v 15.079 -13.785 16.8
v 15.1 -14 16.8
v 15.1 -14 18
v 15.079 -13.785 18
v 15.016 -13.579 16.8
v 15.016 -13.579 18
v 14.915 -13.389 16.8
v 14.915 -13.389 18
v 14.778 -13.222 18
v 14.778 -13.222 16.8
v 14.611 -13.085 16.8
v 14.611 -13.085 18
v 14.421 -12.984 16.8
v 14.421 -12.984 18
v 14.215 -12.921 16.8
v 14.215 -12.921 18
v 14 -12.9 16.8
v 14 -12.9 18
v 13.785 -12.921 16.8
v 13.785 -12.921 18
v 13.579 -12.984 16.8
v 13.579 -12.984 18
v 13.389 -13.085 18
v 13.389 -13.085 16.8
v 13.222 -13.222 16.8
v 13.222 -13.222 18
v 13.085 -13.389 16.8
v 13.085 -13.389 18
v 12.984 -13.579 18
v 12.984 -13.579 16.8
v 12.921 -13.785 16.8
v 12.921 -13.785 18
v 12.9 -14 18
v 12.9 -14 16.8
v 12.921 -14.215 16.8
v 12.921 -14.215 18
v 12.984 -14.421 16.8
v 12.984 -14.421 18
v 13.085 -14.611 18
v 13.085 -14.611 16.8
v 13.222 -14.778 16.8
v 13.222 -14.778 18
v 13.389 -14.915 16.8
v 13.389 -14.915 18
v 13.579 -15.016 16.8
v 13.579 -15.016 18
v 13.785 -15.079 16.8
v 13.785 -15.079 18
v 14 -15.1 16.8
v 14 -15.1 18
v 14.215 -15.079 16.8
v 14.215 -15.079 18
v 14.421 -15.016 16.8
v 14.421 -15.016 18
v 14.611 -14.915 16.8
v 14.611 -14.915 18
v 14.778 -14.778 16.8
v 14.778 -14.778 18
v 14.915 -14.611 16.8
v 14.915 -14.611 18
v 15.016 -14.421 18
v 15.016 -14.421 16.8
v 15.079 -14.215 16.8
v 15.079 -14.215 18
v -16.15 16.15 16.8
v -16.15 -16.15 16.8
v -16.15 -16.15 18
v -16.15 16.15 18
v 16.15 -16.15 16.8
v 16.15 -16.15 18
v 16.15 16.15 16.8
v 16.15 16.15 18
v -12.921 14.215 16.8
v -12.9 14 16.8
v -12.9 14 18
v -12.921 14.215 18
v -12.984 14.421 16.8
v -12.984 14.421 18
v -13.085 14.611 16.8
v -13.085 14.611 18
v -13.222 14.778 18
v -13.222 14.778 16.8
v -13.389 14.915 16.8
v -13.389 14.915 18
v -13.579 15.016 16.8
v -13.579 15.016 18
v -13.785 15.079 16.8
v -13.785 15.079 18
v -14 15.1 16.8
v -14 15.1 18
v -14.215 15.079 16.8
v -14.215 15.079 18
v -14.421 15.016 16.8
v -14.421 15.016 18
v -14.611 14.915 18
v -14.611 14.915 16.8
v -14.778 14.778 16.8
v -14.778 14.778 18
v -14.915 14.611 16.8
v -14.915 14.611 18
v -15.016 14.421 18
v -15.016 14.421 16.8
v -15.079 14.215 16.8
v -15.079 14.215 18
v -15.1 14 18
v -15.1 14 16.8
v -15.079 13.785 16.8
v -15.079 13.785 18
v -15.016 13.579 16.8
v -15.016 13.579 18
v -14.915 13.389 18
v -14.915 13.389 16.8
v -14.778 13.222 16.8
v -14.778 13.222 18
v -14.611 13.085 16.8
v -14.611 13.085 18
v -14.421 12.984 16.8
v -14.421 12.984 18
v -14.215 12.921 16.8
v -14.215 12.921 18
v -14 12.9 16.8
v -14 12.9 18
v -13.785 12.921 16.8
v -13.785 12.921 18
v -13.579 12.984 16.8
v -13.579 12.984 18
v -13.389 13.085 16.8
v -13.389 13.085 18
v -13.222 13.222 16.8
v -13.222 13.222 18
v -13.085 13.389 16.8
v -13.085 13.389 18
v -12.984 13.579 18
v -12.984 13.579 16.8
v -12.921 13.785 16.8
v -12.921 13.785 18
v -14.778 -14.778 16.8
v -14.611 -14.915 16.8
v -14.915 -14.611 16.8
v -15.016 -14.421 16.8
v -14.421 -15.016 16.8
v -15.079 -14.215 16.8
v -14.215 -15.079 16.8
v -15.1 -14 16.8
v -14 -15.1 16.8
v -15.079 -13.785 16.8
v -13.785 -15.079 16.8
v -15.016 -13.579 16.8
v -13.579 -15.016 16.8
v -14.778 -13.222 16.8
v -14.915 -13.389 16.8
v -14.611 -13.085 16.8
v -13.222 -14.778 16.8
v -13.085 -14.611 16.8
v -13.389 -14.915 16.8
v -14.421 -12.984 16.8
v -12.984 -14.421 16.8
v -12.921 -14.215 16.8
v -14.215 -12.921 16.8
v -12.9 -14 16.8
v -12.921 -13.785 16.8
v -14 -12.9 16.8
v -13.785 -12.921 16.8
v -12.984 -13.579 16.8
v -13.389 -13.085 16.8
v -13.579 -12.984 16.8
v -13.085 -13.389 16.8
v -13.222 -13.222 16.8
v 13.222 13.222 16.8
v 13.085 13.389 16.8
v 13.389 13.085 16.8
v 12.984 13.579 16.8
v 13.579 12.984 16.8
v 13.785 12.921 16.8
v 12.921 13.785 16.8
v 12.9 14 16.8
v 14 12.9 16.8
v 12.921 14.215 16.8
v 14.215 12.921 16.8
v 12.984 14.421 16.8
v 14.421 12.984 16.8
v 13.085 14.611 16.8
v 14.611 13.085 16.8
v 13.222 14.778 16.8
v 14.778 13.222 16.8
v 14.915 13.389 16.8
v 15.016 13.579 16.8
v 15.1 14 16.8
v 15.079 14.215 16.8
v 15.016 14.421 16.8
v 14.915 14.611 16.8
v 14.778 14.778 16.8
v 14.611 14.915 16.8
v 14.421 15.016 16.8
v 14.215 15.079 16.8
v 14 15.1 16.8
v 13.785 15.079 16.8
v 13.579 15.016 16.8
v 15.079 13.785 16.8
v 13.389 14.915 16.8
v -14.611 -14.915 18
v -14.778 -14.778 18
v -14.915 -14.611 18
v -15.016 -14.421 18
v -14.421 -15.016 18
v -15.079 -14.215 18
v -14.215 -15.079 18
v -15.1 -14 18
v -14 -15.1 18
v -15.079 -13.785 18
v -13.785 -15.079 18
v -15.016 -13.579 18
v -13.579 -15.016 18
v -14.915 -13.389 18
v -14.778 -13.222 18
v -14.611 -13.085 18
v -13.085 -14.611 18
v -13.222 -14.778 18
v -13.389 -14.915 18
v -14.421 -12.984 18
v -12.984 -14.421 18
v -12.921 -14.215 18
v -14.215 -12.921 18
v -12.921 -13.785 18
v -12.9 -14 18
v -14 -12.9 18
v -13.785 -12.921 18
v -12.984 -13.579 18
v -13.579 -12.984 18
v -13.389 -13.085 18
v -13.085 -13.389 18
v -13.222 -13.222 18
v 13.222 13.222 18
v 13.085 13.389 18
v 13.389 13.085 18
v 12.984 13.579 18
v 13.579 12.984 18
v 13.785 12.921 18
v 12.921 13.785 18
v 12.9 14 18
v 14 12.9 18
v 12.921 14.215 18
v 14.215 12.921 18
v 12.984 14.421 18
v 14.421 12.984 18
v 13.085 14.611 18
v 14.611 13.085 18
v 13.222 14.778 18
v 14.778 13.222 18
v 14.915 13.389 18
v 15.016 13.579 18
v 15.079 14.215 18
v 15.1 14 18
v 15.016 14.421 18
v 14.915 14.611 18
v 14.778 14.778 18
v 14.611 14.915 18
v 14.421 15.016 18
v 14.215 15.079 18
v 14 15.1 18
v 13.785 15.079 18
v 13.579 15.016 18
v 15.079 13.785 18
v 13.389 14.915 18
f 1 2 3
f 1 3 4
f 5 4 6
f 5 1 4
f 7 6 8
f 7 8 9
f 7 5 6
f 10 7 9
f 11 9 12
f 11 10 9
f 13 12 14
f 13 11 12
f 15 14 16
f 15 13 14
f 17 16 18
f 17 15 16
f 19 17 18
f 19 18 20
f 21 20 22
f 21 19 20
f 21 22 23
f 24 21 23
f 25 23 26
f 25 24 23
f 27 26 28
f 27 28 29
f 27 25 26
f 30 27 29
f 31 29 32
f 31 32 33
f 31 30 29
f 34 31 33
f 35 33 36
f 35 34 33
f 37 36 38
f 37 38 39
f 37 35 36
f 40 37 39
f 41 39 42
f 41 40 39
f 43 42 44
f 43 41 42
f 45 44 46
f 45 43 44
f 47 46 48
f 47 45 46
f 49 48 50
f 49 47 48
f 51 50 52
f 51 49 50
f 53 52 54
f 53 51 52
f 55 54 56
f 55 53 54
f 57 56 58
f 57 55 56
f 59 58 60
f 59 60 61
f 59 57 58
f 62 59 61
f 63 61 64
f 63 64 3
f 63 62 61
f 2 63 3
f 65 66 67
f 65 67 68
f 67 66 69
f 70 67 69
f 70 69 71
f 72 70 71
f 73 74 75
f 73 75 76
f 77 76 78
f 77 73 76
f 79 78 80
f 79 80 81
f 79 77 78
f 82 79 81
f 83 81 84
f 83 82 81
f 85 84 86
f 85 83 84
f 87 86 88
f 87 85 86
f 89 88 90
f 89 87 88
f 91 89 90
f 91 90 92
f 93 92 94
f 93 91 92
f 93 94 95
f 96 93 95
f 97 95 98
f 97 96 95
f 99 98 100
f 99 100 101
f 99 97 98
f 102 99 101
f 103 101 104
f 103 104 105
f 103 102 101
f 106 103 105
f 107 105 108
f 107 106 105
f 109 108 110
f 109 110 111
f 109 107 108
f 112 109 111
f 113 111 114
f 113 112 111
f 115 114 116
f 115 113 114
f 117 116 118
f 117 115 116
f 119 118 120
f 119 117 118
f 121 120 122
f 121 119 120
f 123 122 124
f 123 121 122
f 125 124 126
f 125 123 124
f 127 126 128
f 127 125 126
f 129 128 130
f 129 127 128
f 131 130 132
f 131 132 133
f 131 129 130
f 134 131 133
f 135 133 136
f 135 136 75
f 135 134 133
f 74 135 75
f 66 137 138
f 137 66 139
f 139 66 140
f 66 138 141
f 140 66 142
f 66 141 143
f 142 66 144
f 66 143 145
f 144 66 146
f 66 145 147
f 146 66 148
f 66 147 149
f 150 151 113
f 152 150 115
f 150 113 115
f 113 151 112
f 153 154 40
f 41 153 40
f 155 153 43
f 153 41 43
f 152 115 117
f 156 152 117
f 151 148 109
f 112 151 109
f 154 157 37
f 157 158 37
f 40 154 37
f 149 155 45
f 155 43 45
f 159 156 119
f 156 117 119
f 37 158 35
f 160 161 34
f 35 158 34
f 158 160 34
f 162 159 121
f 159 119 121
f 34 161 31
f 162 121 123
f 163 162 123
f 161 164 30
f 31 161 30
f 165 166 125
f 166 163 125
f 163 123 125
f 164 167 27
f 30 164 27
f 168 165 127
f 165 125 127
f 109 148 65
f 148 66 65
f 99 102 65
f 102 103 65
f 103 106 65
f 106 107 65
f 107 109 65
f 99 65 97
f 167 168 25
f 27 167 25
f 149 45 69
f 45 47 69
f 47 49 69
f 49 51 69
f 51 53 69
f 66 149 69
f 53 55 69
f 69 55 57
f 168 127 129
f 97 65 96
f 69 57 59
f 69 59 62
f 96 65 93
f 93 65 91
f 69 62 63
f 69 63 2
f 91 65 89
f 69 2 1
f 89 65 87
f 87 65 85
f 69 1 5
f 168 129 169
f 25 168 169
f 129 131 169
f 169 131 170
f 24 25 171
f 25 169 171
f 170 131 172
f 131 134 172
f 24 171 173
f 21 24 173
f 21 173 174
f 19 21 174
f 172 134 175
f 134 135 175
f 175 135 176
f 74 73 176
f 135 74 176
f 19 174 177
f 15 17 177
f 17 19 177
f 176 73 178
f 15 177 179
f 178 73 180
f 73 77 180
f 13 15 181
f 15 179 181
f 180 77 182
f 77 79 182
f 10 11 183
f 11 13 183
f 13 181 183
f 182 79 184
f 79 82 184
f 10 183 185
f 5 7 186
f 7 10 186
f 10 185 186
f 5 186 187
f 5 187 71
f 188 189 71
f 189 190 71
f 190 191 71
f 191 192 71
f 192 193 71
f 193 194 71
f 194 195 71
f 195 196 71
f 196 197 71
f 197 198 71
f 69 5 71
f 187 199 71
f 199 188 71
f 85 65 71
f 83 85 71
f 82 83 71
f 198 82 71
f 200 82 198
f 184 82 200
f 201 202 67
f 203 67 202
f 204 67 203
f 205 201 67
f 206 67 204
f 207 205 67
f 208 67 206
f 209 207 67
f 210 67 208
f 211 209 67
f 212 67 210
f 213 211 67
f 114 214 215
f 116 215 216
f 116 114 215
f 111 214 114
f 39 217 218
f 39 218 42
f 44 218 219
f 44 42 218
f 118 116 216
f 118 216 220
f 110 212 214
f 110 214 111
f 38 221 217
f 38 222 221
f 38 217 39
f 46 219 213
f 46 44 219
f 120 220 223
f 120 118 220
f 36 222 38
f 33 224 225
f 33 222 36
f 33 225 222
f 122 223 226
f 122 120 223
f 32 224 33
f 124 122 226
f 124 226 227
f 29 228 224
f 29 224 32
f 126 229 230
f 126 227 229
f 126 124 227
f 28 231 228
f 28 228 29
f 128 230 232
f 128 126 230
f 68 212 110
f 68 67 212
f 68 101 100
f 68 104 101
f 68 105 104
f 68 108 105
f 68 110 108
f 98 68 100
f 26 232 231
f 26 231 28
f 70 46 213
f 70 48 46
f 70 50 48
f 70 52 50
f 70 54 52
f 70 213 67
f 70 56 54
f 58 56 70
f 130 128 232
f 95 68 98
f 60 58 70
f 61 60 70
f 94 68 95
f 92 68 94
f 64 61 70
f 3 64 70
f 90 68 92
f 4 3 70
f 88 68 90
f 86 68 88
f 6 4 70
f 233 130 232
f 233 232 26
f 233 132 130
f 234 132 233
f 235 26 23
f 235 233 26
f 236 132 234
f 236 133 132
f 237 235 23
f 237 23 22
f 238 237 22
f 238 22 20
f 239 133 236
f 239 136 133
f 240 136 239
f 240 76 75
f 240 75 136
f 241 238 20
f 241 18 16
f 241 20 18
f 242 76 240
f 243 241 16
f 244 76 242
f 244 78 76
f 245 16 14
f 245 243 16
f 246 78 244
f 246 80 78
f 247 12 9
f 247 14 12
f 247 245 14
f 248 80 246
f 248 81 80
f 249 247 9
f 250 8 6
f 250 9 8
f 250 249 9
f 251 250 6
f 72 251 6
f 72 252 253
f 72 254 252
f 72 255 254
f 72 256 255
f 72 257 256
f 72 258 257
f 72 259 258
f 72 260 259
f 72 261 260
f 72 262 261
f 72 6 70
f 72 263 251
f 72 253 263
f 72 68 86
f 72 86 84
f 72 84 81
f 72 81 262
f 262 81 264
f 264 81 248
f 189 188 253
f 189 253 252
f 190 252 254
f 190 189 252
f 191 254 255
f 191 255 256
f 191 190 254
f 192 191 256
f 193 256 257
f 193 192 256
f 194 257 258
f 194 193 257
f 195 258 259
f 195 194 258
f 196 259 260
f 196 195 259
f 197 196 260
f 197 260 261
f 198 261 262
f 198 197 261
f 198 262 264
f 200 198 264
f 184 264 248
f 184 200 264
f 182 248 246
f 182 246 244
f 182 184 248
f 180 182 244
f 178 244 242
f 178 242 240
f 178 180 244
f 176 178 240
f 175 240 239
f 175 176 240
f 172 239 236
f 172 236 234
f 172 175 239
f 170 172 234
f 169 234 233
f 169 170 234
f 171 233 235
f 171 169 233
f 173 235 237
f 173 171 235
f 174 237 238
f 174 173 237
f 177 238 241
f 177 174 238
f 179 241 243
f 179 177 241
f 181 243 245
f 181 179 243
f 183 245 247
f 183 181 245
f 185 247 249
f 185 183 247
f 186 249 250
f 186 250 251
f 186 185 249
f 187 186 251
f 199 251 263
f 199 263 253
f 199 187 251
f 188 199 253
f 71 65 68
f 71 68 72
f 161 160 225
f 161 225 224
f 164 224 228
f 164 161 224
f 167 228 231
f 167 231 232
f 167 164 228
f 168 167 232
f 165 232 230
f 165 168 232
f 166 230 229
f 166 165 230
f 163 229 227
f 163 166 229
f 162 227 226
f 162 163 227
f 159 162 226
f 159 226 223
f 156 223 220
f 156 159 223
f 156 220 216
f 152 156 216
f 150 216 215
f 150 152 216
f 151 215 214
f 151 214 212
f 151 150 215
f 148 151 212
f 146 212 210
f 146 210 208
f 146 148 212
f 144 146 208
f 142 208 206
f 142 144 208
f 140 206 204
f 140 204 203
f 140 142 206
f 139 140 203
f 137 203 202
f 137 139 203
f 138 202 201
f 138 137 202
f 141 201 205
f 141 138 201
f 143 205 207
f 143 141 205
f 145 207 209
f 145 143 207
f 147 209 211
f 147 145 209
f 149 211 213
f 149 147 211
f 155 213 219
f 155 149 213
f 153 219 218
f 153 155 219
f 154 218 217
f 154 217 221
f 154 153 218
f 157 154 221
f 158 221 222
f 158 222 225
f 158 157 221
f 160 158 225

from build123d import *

# Parameters (mm, degrees)
PCB_1_2_START = 16.8
SKETCH_1_W    = 32.3
SKETCH_1_H    = 32.3
PCB_1_2_DEPTH = 1.2
PCB_START     = 16.8
SKETCH_2_R    = 1.1
PCB_DEPTH     = 1.2


with BuildPart() as part:
    # 草图1 → PCB装配包络_厚1.2 (new body)
    with BuildSketch(Plane.XY.offset(PCB_1_2_START)):
        Rectangle(SKETCH_1_W, SKETCH_1_H)
    extrude(amount=PCB_1_2_DEPTH)

    # 草图2 → 原厂PCB孔径_非打印放孔 (cut)
    with BuildSketch(Plane.XY.offset(PCB_START)):
        with Locations((-14, -14)):
            Circle(SKETCH_2_R)
        with Locations((-14, 14)):
            Circle(SKETCH_2_R)
        with Locations((14, -14)):
            Circle(SKETCH_2_R)
        with Locations((14, 14)):
            Circle(SKETCH_2_R)
    extrude(amount=PCB_DEPTH, mode=Mode.SUBTRACT)


solid = part.part
